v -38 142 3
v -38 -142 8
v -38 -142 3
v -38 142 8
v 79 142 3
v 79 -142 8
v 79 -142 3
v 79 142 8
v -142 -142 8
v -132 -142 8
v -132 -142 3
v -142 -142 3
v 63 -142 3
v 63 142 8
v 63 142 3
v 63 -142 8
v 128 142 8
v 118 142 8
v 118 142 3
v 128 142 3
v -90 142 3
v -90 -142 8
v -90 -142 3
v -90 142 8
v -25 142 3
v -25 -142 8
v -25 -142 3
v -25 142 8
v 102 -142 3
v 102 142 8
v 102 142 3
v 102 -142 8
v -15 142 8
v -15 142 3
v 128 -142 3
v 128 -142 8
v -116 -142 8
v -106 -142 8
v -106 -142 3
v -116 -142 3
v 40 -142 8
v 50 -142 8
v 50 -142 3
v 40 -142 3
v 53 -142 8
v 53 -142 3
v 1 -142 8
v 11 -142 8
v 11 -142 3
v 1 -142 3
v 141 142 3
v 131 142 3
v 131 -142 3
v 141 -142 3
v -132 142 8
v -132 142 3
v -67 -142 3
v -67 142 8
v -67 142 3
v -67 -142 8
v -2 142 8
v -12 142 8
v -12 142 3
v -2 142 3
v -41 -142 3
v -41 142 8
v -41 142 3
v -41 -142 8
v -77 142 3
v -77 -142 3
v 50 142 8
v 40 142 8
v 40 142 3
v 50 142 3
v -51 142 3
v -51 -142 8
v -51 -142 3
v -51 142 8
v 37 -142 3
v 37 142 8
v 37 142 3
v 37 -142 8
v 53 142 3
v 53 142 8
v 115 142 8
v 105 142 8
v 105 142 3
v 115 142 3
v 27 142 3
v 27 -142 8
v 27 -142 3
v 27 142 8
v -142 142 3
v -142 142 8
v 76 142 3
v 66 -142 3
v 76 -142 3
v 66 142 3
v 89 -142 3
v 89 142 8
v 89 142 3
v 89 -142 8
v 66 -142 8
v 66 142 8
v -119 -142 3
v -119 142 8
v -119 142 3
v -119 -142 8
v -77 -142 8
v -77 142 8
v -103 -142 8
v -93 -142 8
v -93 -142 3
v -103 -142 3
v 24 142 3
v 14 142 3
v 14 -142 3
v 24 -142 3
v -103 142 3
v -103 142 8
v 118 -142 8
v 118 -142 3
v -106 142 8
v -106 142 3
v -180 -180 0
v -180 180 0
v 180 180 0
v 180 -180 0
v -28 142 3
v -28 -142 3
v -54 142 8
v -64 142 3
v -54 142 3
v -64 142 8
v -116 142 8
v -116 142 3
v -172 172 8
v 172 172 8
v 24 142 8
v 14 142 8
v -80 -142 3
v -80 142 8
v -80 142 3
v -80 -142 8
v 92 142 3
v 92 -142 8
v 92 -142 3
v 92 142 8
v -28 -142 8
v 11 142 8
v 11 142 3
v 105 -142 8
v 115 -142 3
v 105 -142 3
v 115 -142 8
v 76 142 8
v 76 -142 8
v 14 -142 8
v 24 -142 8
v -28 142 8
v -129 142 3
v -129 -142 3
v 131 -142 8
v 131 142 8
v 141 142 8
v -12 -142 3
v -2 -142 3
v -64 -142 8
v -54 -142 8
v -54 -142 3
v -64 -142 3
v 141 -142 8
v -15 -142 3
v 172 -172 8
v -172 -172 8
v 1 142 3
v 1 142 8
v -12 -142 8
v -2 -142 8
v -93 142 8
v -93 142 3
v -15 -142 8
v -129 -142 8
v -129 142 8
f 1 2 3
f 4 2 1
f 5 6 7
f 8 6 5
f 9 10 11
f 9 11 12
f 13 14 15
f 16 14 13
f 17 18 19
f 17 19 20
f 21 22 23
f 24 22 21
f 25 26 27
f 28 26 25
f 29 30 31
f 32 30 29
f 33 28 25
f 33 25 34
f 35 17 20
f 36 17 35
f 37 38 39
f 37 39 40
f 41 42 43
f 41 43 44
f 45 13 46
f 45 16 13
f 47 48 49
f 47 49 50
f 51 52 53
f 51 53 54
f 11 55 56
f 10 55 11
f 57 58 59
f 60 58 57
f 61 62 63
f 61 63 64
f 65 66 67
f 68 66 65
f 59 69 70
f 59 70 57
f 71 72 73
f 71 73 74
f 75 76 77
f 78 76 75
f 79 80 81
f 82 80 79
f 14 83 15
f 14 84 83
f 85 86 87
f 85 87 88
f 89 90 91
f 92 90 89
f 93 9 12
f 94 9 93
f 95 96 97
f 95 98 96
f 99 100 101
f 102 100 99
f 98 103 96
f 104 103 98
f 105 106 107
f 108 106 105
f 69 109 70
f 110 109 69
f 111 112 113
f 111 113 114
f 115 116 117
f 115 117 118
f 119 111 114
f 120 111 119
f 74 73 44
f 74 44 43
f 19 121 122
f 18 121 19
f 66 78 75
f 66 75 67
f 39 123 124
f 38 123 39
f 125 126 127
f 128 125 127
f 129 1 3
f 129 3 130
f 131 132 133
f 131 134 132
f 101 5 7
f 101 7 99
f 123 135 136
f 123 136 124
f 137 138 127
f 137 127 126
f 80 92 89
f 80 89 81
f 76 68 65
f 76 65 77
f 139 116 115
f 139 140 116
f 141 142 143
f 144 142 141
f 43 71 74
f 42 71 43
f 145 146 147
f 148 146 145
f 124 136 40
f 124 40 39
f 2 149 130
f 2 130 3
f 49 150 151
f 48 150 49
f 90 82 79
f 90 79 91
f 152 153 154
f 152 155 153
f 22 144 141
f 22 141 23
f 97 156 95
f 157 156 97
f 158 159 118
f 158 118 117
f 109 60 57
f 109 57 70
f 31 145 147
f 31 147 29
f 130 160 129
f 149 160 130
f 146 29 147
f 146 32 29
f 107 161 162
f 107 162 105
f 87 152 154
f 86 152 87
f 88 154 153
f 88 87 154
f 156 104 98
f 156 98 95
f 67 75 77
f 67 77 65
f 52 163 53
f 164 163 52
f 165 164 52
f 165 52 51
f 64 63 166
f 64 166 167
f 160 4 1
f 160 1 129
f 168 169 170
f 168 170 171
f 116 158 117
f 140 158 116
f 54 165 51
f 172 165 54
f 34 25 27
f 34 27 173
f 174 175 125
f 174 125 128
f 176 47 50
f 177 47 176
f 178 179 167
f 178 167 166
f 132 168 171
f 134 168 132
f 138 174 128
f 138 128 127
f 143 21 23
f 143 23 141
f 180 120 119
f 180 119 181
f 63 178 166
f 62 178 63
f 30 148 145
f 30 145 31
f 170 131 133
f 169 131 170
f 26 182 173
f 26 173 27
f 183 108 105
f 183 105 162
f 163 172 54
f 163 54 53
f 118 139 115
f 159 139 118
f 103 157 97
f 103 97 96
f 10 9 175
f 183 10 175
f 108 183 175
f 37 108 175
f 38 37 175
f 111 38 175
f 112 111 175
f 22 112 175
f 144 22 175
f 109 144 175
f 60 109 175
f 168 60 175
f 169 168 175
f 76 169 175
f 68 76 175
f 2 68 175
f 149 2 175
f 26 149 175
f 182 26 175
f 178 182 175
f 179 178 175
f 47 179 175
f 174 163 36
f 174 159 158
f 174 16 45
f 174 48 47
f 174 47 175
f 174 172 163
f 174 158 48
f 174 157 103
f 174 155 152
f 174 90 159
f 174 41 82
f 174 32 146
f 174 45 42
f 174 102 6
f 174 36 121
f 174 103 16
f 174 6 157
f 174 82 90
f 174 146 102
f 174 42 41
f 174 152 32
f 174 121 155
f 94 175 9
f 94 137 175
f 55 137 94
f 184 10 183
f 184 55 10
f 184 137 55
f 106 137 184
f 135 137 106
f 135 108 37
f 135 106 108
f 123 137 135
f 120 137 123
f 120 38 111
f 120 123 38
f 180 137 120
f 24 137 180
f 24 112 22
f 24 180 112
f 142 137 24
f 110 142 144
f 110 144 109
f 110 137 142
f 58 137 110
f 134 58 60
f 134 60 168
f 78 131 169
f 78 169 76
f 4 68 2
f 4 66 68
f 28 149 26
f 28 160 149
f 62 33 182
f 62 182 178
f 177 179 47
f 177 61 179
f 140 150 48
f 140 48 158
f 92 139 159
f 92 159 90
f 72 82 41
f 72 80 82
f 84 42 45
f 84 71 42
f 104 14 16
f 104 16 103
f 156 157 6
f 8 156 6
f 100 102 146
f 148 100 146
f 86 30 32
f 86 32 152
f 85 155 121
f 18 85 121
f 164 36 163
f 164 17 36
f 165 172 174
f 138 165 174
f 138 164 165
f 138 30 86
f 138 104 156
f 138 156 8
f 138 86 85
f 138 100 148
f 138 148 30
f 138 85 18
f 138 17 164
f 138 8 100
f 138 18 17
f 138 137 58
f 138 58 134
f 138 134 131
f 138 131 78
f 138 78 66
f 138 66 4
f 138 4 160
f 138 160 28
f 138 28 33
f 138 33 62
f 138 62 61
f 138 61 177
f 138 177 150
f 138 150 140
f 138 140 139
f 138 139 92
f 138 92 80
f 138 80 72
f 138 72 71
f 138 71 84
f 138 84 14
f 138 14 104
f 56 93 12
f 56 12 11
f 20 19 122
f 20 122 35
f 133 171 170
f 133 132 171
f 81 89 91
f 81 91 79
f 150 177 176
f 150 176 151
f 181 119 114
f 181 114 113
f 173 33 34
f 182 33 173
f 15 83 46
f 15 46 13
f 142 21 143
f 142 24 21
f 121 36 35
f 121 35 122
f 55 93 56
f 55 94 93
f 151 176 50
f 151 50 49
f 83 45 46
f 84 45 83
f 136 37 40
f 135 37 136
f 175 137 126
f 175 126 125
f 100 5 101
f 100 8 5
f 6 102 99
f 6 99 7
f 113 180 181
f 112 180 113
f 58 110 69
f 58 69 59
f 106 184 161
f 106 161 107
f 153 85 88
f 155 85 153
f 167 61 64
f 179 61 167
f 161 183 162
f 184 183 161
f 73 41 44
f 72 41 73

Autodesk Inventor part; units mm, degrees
ref_plane "YZ Plane" through (0, 0, 0) normal (1, 0, 0) x (0, 1, 0)
ref_plane "XZ Plane" through (0, 0, 0) normal (0, 1, 0) x (-1, 0, 0)
ref_plane "XY Plane" through (0, 0, 0) normal (0, 0, 1) x (1, 0, 0)
sketch "Sketch1" plane through (0, 0, 0) normal (0, 0, 1) x (1, 0, 0)
  line L0 (-180, 180) -> (180, 180)
  line L1 (180, 180) -> (180, -180)
  line L2 (180, -180) -> (-180, -180)
  line L3 (-180, -180) -> (-180, 180)
  point P0 (0, 0)
  dimension "d0" = 360
  dimension "d1" = 360
  dimension "d2" = 180
  dimension "d3" = 180
extrude "Extrusion1" add sketch "Sketch1" along normal blind 8
chamfer "Chamfer1" distance 8 angle 45 4 edges at (-180, 0, 8) (0, -180, 8) (180, 0, 8) (0, 180, 8)
sketch "Sketch3" plane through (0, 0, 8) normal (0, 0, 1) x (1, 0, 0)
  line L0 (-172, -172) -> (-172, 172) construction
  line L1 (-172, 142) -> (172, 142) construction
  line L2 (-172, 172) -> (172, 172) construction
  line L3 (-142, 172) -> (-142, -172) construction
  line L4 (172, -172) -> (-172, -172) construction
  line L5 (-172, -142) -> (172, -142) construction
  line L6 (172, 172) -> (172, -172) construction
  line L7 (142, 172) -> (142, -172) construction
  line L8 (-142, 142) -> (-132, 142)
  line L9 (-132, 142) -> (-132, -142)
  line L10 (-132, -142) -> (-142, -142)
  line L11 (-142, -142) -> (-142, 142)
  point P0 (0, 0)
  dimension "d12" = 30
  dimension "d13" = 30
  dimension "d14" = 30
  dimension "d15" = 30
  dimension "d16" = 10
extrude "Extrusion2" cut sketch "Sketch3" against normal blind 5
pattern_linear "Rectangular Pattern1" count 22 spacing 13 along (1, 0, 0) of "Extrusion2"
equation "\"d0\" = edge_length"
equation "\"d1\" = edge_length"
equation "\"d2\" = 0.5 * edge_length"
equation "\"d3\" = 0.5 * edge_length"
equation "\"d4\" = wall_width"
equation "\"d6\" = wall_width"
equation "\"d12\" = d13"
equation "\"d14\" = d13"
equation "\"d15\" = d13"
equation "\"edge_length\" = 360"
equation "\"wall_width\" = 8"
properties part number "Element"
